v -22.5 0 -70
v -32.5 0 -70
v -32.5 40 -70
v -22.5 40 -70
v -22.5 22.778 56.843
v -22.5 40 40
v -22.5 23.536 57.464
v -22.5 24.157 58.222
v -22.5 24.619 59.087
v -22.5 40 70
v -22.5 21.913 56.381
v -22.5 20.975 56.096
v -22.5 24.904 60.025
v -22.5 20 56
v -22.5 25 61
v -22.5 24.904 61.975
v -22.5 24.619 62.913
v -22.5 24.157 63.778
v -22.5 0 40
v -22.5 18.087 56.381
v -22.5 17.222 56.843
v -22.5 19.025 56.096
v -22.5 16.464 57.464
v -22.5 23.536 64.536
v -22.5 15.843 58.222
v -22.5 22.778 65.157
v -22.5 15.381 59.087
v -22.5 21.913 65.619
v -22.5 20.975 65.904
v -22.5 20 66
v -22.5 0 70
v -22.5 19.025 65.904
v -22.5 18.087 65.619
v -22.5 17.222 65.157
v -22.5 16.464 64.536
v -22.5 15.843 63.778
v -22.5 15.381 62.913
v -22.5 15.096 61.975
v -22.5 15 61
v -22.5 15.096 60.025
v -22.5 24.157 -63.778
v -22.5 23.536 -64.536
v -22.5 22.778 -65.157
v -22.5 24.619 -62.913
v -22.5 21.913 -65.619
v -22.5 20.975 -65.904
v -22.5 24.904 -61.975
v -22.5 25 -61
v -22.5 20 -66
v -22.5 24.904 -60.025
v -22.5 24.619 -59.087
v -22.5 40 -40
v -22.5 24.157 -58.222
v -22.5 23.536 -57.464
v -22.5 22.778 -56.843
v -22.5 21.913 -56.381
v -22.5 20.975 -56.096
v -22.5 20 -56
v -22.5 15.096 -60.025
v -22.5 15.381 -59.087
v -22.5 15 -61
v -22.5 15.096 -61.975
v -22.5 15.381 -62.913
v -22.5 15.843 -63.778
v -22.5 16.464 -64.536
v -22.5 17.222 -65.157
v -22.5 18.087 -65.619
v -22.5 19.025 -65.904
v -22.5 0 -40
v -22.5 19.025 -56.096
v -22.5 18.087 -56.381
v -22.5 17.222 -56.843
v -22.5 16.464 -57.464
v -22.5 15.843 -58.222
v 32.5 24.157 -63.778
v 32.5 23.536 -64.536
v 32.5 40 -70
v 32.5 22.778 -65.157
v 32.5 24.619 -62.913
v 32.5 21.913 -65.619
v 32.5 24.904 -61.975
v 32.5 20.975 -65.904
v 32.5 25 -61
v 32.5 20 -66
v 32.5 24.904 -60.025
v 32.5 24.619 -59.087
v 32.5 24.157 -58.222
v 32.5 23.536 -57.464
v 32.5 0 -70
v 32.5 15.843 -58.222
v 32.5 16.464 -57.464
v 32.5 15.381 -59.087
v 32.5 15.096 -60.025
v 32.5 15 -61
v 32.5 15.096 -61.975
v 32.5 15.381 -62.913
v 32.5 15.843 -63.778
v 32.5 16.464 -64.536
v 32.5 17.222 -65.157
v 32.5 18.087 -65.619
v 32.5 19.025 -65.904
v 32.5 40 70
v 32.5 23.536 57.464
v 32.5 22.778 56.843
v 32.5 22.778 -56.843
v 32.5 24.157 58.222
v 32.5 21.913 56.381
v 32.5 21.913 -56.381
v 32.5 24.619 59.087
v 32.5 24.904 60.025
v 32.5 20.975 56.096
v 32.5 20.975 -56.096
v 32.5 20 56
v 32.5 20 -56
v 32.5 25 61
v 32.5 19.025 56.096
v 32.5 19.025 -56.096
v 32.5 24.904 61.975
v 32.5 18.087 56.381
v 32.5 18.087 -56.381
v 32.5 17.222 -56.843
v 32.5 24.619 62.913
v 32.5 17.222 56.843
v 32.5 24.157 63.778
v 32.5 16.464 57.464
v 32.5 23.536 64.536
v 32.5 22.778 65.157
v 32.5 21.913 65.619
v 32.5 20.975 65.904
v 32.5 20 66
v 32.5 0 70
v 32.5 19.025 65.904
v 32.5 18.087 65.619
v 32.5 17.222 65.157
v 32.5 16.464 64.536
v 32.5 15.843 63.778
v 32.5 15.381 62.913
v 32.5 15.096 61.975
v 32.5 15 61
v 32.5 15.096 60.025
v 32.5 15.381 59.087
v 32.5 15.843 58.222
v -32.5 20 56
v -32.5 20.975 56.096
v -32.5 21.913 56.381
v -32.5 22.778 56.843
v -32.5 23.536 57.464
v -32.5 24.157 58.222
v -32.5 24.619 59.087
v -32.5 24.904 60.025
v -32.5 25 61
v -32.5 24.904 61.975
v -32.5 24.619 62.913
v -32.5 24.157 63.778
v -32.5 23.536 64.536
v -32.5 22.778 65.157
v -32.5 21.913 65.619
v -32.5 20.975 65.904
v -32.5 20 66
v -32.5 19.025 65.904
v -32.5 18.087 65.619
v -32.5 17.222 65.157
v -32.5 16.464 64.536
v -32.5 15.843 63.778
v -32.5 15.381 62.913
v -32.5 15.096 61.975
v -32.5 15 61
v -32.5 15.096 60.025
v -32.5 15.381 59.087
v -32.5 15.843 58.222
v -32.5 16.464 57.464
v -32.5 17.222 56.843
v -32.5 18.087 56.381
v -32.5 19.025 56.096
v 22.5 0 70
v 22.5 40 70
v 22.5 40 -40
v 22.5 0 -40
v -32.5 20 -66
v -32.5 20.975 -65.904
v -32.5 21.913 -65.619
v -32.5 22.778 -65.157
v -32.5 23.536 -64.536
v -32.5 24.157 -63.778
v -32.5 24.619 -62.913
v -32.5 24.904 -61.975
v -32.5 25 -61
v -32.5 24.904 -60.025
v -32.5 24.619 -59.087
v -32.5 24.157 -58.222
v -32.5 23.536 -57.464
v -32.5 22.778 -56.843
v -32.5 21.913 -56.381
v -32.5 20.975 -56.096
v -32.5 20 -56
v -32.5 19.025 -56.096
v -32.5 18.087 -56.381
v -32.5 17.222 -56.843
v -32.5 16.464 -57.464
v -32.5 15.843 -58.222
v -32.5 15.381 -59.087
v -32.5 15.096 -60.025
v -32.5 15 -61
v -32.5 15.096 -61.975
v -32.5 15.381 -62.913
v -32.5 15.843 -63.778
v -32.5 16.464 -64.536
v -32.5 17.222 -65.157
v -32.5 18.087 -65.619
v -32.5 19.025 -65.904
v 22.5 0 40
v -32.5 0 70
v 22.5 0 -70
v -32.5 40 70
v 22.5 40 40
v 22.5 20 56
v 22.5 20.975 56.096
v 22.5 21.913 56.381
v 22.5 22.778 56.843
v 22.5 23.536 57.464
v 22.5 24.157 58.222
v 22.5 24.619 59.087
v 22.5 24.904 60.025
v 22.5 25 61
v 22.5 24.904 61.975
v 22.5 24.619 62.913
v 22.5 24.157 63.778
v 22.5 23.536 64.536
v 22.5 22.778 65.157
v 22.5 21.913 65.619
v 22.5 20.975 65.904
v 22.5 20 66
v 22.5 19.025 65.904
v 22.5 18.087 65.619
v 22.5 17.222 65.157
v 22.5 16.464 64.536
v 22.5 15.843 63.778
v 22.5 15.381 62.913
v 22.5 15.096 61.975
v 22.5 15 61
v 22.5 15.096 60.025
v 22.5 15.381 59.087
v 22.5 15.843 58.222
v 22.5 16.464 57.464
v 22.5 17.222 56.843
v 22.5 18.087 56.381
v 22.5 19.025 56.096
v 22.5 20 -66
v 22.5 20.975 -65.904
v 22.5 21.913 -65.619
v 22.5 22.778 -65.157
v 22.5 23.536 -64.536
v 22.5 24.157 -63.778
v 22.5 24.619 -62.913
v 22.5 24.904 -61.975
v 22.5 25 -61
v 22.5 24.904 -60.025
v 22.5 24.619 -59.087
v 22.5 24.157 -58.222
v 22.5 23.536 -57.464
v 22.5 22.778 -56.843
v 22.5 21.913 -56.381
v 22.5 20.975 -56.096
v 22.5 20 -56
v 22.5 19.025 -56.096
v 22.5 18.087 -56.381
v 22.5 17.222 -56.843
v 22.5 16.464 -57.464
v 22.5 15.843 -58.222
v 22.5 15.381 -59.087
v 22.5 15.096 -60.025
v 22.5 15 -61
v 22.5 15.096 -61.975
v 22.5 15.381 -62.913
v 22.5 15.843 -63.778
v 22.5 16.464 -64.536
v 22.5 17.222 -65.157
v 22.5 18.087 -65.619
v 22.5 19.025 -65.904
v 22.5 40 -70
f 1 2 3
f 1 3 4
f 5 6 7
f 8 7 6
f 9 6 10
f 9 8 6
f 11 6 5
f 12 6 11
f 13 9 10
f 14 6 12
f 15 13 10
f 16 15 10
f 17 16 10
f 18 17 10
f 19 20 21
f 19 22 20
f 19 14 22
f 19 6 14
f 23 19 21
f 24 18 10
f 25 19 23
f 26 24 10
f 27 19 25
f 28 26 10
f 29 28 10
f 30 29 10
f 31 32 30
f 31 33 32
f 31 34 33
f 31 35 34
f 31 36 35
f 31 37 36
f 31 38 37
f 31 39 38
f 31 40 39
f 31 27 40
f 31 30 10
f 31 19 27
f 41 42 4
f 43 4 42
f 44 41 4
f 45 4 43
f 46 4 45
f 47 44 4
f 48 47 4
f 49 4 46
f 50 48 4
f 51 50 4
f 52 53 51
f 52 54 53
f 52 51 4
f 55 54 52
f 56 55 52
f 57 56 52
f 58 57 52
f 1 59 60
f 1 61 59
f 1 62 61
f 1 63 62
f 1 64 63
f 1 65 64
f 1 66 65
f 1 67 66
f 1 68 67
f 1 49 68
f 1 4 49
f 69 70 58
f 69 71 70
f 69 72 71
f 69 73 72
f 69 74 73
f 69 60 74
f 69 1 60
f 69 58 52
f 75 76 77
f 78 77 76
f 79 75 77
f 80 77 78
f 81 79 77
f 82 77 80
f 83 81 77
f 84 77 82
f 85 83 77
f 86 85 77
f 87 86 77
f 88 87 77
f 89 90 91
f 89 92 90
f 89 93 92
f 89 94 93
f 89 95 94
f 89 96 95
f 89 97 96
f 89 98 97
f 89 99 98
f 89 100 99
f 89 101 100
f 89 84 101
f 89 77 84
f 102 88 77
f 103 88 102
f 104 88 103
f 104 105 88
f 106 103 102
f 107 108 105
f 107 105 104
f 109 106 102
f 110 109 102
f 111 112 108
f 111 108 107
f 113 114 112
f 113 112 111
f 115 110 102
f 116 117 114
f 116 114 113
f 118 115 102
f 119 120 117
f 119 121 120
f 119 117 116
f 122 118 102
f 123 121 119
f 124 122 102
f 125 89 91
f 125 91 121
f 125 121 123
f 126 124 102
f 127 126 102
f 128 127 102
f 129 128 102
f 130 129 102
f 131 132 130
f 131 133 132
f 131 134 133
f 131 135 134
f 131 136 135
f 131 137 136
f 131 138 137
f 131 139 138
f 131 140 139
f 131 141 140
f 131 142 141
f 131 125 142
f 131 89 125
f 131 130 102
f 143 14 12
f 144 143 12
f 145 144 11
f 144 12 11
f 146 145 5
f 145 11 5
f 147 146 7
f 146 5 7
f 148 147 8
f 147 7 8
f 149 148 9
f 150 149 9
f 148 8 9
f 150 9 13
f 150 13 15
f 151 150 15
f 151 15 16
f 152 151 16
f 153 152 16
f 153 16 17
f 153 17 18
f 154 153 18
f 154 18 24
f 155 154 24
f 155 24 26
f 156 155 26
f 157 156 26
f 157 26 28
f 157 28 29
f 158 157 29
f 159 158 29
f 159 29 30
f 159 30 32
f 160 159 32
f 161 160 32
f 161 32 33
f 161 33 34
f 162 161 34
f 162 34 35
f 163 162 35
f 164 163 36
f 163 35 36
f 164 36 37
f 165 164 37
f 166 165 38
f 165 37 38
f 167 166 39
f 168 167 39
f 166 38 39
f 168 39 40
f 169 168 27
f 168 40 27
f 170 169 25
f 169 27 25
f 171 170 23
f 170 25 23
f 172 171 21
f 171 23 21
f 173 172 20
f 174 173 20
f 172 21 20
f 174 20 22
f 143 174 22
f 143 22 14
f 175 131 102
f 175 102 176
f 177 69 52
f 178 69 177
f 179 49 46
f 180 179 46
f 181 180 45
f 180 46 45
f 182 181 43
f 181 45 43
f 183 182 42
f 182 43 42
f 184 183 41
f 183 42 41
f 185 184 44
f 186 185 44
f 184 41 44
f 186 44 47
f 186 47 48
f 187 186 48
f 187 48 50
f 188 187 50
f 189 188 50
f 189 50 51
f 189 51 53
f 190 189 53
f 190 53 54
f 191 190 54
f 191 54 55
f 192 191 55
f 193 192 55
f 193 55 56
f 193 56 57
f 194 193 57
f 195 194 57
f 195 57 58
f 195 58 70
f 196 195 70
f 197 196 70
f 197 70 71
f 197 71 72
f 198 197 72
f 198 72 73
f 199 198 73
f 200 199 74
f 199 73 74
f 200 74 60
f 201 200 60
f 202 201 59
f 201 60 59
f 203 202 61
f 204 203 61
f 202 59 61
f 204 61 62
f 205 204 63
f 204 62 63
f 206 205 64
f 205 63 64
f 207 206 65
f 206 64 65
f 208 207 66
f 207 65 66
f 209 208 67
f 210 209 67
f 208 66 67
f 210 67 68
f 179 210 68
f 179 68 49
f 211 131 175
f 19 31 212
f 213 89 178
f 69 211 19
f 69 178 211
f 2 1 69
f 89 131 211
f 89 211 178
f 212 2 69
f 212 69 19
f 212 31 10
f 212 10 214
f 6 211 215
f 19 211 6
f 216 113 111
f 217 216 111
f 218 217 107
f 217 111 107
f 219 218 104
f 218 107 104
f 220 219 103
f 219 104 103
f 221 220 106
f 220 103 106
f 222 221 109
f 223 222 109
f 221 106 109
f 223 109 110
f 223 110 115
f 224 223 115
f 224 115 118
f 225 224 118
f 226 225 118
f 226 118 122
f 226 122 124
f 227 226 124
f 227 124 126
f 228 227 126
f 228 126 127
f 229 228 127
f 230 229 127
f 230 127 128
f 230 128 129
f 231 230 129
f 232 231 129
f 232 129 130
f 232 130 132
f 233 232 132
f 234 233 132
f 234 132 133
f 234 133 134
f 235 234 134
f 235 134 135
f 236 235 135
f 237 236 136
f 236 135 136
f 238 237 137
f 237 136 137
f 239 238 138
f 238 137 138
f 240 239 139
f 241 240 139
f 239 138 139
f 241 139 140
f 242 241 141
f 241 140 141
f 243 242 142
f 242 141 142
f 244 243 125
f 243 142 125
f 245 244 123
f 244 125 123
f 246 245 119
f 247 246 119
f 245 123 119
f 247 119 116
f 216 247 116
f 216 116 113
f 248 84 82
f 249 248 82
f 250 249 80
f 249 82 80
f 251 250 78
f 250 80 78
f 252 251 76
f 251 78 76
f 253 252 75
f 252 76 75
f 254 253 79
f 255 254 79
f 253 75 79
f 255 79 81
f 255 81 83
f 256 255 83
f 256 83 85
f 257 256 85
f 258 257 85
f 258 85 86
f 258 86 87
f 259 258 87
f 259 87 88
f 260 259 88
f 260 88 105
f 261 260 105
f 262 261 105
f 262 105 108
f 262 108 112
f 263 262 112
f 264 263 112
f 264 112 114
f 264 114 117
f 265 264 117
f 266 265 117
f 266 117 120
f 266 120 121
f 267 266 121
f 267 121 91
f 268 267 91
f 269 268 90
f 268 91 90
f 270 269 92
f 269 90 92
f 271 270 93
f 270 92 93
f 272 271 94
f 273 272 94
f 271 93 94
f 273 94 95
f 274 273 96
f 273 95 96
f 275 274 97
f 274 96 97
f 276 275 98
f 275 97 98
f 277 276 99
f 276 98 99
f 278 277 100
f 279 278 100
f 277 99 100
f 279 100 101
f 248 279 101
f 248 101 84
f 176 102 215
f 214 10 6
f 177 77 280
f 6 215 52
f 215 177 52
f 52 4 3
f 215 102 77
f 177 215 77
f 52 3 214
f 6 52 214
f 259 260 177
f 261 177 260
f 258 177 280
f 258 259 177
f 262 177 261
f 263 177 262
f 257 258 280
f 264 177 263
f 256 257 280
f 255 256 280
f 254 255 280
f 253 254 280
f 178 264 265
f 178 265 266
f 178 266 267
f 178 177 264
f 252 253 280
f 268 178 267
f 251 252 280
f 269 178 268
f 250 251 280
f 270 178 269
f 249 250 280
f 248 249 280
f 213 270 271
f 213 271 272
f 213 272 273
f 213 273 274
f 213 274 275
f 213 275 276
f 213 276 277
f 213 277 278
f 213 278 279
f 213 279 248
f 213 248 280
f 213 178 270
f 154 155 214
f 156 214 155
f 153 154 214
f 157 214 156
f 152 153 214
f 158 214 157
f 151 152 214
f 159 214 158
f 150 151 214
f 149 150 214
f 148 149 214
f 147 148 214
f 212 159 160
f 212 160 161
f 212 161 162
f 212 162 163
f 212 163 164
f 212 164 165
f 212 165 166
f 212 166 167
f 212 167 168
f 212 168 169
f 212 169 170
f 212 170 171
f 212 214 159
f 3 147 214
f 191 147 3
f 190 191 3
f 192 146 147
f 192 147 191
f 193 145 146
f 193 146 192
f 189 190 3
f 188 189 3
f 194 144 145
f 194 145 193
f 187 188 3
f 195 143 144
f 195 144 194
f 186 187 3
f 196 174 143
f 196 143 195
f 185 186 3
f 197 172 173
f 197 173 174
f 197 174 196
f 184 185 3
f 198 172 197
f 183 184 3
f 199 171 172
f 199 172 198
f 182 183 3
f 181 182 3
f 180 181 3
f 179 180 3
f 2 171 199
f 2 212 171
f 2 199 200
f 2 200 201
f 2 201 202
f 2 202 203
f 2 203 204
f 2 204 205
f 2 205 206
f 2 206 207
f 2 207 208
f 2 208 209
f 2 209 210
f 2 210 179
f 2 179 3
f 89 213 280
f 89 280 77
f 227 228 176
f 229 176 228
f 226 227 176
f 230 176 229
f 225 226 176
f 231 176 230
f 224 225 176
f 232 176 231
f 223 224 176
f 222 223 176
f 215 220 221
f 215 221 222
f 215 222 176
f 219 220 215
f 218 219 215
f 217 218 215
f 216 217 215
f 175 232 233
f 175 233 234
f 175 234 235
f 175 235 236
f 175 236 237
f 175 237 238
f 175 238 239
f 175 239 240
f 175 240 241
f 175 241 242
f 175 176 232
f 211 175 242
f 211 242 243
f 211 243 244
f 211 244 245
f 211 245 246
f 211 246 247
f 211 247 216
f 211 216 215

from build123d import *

# Parameters (mm, degrees)
BOSS_EXTRUDE1_DEPTH = 40
CUT_EXTRUDE1_REACH  = 105.562
SKETCH3_R           = 5


with BuildPart() as part:
    # Sketch2 → Boss-Extrude1 (new body)
    with BuildSketch(Plane(origin=(0, 0, 0), x_dir=(1, 0, 0), z_dir=(0, 1, 0))):
        Polygon((-22.5, 70), (-22.5, 40), (22.5, 40), (22.5, 70), (32.5, 70), (32.5, -70), (22.5, -70), (22.5, -40), (-22.5, -40), (-22.5, -70), (-32.5, -70), (-32.5, 70), align=None)
    extrude(amount=BOSS_EXTRUDE1_DEPTH)

    # Cut-Extrude1: up to this face of the body (flat: up to its plane)
    cut_extrude1_end = Plane(part.part.faces().sort_by_distance((-32.5, 20, 0))[0])
    # Sketch3 → Cut-Extrude1 (cut, up to the picked face)
    with BuildSketch(Plane(origin=(32.5, 0, 0), x_dir=(0, 0, -1), z_dir=(1, 0, 0)), mode=Mode.PRIVATE) as cut_extrude1_sk1:
        with Locations((-61, 20)):
            Circle(SKETCH3_R)
    cut_extrude1_tool1 = split(extrude(cut_extrude1_sk1.sketch, amount=-CUT_EXTRUDE1_REACH, mode=Mode.PRIVATE), bisect_by=cut_extrude1_end, keep=Keep.BOTH, mode=Mode.PRIVATE)
    # Sketch3 → Cut-Extrude1 (cut, up to the picked face)
    with BuildSketch(Plane(origin=(32.5, 0, 0), x_dir=(0, 0, -1), z_dir=(1, 0, 0)), mode=Mode.PRIVATE) as cut_extrude1_sk2:
        with Locations((61, 20)):
            Circle(SKETCH3_R)
    cut_extrude1_tool2 = split(extrude(cut_extrude1_sk2.sketch, amount=-CUT_EXTRUDE1_REACH, mode=Mode.PRIVATE), bisect_by=cut_extrude1_end, keep=Keep.BOTH, mode=Mode.PRIVATE)
    add(cut_extrude1_tool1.solids().sort_by(Axis((32.5, 20, 61), (-1, 0, 0)))[0], mode=Mode.SUBTRACT)
    add(cut_extrude1_tool2.solids().sort_by(Axis((32.5, 20, -61), (-1, 0, 0)))[0], mode=Mode.SUBTRACT)


solid = part.part
